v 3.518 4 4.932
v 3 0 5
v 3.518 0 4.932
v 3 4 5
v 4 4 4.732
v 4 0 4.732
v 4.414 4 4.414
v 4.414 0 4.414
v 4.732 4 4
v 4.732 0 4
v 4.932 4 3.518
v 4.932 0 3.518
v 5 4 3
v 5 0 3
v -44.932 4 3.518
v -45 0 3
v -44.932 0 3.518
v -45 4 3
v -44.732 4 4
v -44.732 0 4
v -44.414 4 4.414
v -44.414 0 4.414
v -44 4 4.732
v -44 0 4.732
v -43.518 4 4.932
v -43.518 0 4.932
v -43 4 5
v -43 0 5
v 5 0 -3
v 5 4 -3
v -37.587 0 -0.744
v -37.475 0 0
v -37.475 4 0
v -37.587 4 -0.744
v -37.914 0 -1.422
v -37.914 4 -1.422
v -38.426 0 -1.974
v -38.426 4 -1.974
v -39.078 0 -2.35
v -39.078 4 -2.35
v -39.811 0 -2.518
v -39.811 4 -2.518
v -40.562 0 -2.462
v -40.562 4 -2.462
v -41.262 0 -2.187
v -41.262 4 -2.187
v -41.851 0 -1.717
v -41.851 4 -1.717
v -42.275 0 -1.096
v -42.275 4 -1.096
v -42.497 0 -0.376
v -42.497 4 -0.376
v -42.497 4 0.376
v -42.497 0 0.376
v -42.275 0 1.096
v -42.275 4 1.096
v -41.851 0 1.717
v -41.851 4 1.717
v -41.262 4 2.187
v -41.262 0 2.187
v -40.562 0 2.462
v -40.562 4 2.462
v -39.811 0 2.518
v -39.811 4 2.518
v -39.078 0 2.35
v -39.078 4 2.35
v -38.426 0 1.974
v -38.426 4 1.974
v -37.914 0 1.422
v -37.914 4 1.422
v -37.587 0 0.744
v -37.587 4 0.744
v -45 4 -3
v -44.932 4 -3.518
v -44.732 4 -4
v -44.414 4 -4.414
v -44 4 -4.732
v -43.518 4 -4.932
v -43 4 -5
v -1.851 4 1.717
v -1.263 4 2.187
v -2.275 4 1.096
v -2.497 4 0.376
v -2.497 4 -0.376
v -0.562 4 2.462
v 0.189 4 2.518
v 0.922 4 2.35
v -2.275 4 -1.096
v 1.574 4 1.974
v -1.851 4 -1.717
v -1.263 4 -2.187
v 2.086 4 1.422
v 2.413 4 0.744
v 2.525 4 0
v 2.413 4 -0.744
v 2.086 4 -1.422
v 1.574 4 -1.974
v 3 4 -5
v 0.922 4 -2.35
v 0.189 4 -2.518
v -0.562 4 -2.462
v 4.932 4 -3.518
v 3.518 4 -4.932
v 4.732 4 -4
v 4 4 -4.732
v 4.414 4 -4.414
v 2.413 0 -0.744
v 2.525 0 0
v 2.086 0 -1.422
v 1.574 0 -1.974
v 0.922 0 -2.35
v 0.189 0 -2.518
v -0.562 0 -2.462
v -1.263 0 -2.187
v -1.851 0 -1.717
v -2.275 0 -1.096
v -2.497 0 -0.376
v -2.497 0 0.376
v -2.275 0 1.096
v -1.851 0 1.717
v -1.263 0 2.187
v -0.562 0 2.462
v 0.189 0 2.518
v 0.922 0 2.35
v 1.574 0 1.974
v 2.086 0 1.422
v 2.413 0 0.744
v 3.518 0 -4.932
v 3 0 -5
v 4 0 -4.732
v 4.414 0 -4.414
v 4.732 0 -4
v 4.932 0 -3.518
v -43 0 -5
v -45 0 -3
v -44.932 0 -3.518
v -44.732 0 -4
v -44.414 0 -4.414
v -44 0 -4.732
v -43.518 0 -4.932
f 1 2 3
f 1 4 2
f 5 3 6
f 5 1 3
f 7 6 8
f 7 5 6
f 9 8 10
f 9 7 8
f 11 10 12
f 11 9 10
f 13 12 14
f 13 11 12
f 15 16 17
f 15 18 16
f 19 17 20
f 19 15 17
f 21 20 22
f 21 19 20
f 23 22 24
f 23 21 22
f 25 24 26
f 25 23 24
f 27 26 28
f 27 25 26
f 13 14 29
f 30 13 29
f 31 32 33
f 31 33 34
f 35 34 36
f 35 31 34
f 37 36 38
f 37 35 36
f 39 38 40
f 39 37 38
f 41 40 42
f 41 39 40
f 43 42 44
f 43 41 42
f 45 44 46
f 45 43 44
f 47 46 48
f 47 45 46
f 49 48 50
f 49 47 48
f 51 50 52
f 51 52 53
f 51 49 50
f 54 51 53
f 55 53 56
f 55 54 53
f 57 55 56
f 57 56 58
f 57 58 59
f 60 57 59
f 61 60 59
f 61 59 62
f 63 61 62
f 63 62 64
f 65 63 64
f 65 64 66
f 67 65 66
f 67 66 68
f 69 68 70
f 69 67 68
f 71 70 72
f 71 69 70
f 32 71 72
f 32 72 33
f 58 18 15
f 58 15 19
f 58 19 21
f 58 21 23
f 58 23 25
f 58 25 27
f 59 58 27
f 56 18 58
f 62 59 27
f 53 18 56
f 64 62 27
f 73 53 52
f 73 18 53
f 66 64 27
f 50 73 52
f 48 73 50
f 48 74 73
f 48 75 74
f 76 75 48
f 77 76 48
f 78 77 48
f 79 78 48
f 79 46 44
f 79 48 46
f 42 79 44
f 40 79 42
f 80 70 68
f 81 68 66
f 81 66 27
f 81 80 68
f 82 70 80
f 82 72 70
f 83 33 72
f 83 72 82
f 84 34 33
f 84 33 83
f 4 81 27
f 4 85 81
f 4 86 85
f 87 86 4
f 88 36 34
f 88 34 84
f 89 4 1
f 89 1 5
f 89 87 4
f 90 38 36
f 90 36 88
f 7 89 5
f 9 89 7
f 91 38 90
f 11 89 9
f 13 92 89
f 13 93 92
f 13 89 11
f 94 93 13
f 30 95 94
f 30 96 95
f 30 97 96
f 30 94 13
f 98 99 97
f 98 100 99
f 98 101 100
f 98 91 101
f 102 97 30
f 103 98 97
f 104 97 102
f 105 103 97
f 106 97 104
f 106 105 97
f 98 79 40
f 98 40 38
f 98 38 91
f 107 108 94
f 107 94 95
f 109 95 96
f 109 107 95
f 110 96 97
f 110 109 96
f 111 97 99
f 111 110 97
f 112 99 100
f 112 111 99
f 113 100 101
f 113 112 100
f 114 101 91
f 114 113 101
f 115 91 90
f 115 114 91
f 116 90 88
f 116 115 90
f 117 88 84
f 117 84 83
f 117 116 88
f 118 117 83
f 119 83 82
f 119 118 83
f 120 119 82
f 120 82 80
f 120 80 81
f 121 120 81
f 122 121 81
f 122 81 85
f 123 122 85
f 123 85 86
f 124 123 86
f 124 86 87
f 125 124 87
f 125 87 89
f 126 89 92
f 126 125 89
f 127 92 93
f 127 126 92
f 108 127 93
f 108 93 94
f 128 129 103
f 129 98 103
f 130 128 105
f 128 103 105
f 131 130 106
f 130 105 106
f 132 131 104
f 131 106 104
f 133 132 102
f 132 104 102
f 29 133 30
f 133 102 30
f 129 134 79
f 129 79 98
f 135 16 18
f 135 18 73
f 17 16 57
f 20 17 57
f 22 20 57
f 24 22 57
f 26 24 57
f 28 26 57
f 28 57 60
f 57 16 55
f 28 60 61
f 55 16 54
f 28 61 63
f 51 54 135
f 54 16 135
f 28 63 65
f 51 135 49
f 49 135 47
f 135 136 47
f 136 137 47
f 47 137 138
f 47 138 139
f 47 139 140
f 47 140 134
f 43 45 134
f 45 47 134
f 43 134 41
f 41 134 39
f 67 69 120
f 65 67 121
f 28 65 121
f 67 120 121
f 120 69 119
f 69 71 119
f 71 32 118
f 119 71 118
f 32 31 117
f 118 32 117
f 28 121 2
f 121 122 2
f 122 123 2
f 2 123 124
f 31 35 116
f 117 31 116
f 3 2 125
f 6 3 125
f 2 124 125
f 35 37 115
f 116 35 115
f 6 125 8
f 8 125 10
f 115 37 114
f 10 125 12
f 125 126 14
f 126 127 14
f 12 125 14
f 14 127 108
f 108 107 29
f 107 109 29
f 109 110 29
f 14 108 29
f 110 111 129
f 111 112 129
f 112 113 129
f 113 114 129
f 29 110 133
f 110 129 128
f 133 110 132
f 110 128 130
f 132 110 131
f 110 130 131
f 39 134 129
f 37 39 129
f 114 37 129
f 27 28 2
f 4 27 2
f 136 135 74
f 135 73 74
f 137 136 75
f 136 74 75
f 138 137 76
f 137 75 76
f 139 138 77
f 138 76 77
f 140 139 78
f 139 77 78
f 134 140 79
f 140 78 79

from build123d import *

# Parameters (mm, degrees)
SKETCH_1_W      = 50
SKETCH_1_H      = 10
SKETCH_1_R      = 2.525
EXTRUDE_1_DEPTH = 4
FILLET_1_R      = 2


with BuildPart() as part:
    # 草图1 → 凸台-拉伸1 (new body)
    with BuildSketch(Plane(origin=(0, 0, 0), x_dir=(1, 0, 0), z_dir=(0, 1, 0))):
        with Locations((-20, 0)):
            Rectangle(SKETCH_1_W, SKETCH_1_H)
        Circle(SKETCH_1_R, mode=Mode.SUBTRACT)
        with Locations((-40, 0)):
            Circle(SKETCH_1_R, mode=Mode.SUBTRACT)
    extrude(amount=EXTRUDE_1_DEPTH)

    # 圆角1
    fillet_1_edges = [part.edges().sort_by_distance(p)[0] for p in [
        (-45, 2, -5),
        (5, 2, -5),
        (5, 2, 5),
        (-45, 2, 5),
    ]]
    fillet(fillet_1_edges, radius=FILLET_1_R)


solid = part.part
